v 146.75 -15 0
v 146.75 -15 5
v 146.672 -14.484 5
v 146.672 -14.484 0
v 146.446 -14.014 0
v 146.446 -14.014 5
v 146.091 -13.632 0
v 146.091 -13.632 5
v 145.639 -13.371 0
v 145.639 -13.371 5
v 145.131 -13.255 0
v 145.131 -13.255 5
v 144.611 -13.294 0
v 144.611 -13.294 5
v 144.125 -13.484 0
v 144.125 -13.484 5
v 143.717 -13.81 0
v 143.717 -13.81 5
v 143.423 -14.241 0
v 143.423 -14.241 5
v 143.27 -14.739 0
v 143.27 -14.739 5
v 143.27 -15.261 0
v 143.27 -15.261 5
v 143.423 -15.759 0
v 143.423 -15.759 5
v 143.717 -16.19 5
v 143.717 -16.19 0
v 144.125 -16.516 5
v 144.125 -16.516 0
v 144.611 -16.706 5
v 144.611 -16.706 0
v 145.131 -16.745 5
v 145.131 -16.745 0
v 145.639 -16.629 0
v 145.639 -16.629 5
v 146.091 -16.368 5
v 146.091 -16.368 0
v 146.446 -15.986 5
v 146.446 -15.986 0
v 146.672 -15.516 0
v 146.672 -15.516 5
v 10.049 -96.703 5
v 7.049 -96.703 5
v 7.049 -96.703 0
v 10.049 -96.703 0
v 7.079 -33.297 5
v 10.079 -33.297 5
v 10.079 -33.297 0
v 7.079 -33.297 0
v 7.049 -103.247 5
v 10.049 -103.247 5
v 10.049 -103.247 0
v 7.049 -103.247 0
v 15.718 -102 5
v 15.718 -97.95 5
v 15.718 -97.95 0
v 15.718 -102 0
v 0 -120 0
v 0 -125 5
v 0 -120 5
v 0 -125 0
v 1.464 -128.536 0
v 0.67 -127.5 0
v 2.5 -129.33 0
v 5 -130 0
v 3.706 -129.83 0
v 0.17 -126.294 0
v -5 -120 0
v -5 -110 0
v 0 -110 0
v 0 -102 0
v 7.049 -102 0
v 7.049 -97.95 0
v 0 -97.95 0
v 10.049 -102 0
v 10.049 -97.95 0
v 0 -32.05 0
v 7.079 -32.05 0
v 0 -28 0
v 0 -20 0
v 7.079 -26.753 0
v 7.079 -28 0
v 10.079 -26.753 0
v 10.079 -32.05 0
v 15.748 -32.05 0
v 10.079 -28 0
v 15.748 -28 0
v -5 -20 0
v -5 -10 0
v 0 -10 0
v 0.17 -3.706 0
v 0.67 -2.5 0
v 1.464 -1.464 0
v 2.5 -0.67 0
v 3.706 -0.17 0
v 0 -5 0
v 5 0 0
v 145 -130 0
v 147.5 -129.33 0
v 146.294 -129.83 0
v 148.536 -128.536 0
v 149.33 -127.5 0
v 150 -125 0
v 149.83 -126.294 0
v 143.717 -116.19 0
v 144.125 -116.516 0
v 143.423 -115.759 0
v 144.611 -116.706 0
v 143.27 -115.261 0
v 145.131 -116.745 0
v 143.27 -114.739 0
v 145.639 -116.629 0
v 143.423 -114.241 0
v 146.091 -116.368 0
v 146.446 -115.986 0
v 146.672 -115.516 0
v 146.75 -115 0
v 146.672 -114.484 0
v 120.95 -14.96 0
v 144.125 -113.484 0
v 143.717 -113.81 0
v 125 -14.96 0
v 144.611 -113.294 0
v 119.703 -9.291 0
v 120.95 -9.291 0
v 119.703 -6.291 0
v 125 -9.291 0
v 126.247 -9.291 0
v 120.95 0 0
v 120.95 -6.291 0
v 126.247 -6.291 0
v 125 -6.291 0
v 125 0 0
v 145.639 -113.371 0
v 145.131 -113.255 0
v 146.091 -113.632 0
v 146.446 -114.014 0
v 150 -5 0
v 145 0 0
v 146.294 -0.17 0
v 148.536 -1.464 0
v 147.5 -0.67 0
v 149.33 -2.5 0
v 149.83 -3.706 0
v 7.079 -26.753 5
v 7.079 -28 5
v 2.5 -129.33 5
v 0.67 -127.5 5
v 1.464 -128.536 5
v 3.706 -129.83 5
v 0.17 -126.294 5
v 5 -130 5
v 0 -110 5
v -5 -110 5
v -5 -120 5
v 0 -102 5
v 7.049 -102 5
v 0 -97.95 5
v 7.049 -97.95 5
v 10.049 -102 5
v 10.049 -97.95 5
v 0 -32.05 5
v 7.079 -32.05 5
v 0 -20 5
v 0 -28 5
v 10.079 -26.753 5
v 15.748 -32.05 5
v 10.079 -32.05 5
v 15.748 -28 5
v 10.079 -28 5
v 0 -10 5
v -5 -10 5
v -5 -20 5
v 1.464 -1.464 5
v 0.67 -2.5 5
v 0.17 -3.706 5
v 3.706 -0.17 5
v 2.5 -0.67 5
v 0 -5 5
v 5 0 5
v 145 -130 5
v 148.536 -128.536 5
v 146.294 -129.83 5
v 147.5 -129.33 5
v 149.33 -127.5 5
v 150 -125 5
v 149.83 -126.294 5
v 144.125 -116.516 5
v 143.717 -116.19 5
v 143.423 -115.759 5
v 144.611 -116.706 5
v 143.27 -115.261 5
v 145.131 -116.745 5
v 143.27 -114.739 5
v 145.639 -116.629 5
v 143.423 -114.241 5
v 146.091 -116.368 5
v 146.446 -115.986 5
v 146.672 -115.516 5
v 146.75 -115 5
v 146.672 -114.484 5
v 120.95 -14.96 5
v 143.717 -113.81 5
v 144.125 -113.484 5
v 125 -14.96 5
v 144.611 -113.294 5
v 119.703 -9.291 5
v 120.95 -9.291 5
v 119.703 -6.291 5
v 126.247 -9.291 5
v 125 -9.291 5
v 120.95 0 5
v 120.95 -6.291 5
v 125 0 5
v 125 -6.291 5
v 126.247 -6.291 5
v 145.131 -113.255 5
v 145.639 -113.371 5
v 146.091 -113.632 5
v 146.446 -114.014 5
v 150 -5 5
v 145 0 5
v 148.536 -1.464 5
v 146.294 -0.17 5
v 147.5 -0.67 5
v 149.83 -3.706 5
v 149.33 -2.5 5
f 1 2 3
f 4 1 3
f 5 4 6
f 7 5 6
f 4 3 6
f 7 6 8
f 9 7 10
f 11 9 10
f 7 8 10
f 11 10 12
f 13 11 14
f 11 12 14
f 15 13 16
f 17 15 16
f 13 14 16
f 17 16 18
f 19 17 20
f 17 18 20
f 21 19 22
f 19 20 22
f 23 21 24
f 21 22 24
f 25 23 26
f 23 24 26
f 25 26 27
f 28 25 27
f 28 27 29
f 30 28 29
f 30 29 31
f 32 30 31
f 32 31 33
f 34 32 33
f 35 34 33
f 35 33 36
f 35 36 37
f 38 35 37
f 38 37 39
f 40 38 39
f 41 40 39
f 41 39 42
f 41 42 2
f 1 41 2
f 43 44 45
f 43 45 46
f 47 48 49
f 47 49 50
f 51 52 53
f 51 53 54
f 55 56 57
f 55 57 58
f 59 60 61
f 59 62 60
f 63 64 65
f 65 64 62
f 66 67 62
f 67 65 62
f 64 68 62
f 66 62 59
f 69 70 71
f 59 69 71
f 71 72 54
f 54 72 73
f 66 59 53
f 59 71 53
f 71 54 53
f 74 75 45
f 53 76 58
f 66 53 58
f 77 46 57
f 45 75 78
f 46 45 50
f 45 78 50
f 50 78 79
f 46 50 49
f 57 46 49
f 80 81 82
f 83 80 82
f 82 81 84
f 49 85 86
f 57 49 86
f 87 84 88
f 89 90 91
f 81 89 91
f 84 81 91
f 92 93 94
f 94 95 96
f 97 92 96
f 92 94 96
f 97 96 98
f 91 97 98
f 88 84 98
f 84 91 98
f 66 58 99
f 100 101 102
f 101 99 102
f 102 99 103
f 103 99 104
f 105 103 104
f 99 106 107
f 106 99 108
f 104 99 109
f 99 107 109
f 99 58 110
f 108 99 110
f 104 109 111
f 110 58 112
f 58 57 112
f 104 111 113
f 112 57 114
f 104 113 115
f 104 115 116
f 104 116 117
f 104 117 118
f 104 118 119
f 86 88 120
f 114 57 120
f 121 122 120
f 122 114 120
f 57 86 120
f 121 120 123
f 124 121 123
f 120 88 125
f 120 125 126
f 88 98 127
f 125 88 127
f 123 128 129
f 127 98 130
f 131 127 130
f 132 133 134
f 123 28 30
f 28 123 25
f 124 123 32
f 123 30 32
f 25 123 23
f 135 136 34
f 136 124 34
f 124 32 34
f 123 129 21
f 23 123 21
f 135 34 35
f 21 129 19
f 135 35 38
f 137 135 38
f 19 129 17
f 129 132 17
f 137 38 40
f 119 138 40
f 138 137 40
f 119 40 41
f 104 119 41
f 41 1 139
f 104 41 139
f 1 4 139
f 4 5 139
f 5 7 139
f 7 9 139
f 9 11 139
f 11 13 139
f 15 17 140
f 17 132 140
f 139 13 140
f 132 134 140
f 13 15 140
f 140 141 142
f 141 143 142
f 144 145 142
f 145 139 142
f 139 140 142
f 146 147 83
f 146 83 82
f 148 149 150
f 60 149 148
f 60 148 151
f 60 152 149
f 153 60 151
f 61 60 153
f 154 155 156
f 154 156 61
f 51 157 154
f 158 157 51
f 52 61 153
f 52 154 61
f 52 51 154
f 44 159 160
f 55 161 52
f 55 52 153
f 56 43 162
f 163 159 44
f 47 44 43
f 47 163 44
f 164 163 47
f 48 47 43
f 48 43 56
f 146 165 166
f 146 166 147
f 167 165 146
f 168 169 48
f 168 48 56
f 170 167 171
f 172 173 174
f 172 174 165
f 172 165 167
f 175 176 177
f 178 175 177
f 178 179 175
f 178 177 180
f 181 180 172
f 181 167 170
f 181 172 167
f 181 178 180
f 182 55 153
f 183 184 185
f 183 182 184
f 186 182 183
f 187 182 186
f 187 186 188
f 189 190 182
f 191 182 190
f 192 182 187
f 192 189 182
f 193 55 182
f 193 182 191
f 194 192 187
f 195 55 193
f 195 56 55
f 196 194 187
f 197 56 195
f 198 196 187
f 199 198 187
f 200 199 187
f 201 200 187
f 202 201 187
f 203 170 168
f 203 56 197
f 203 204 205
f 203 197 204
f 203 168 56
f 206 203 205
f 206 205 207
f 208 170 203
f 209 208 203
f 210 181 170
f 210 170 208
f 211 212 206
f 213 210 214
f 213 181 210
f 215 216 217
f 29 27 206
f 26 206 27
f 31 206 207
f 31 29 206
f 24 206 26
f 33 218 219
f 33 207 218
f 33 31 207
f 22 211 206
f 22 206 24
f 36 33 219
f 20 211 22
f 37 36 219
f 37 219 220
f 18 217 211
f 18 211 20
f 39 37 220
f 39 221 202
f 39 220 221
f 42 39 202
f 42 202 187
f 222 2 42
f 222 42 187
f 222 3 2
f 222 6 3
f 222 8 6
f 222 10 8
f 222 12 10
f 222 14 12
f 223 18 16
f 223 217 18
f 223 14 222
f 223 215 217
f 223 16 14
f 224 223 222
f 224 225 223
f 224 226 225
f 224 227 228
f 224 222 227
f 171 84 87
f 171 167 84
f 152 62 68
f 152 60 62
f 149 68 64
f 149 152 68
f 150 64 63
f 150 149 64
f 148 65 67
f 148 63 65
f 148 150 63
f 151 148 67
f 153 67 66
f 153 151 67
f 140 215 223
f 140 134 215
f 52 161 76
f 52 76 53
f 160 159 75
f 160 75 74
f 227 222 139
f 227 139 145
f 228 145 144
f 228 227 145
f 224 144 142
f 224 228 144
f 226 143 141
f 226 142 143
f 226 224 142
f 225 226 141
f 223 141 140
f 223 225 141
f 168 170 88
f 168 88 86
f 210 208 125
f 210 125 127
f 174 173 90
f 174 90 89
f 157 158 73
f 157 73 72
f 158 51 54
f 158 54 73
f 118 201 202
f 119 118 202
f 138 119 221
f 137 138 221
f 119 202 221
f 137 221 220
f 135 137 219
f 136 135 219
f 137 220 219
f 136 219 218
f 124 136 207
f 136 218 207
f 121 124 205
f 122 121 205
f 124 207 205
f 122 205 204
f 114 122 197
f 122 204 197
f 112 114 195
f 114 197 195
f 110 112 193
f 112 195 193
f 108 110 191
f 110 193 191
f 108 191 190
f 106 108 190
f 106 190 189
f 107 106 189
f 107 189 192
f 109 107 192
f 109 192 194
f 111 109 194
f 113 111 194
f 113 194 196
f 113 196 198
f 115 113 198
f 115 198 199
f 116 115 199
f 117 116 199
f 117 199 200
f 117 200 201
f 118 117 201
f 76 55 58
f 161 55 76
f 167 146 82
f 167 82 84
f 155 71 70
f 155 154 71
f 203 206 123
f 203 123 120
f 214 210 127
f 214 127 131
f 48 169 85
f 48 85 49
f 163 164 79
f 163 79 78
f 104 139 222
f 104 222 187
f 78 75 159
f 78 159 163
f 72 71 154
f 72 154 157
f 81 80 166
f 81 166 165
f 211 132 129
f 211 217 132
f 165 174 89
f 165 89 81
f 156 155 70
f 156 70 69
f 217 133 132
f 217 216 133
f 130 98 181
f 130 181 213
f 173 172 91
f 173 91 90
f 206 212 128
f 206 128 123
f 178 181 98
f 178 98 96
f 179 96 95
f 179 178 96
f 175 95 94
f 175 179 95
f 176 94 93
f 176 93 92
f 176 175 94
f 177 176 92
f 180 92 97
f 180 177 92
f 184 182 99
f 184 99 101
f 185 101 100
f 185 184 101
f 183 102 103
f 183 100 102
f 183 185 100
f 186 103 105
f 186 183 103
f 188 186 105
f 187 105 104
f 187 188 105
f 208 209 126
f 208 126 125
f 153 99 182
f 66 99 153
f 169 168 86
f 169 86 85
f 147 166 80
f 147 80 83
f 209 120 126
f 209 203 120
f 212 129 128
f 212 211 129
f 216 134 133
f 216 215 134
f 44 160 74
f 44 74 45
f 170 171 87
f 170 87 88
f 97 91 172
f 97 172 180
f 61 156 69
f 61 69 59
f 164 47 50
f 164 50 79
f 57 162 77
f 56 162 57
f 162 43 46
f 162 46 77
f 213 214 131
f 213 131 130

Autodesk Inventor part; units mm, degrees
ref_plane "YZ Plane" through (0, 0, 0) normal (1, 0, 0) x (0, 1, 0)
ref_plane "XZ Plane" through (0, 0, 0) normal (0, 1, 0) x (-1, 0, 0)
ref_plane "XY Plane" through (0, 0, 0) normal (0, 0, 1) x (1, 0, 0)
sketch "Boceto1" plane through (0, 0, 0) normal (0, 0, 1) x (1, 0, 0)
  line L0 (0, 0) -> (150, 0)
  line L1 (150, 0) -> (150, -130)
  line L2 (150, -130) -> (0, -130)
  line L3 (0, -130) -> (0, 0)
  dimension "d2" = 130
  dimension "d3" = 150
extrude "Extrusión1" add sketch "Boceto1" along normal blind 5
fillet "Empalme1" radius 5 4 edges at (150, -130, 2.5) (150, 0, 2.5) (0, 0, 2.5) (0, -130, 2.5)
sketch "Boceto2" plane through (0, 0, 5) normal (0, 0, 1) x (1, 0, 0)
  line L0 (0, -125) -> (0, -5) projected
  line L1 (0, -10) -> (-5, -10)
  line L2 (-5, -10) -> (-5, -20)
  line L3 (-5, -20) -> (0, -20)
  line L4 (0, -20) -> (0, -10)
  line L5 (0, -110) -> (-5, -110)
  line L6 (-5, -110) -> (-5, -120)
  line L7 (-5, -120) -> (0, -120)
  line L8 (0, -120) -> (0, -110)
  line L9 (5, 0) -> (145, 0) projected
  point P0 (0, 0)
  dimension "d5" = 10
  dimension "d6" = 10
  dimension "d7" = 5
  dimension "d8" = 5
  dimension "d11" = 10
  dimension "d12" = 110
extrude "Extrusión2" add sketch "Boceto2" against normal blind 5
sketch "Boceto3" plane through (0, 0, 5) normal (0, 0, 1) x (1, 0, 0)
  line L0 (-5, -20) -> (0, -20) projected
  line L1 (0, -110) -> (0, -20) projected
  line L2 (-0.1512, -97.9504) -> (7.0488, -97.9504)
  line L3 (7.0488, -97.9504) -> (7.0488, -96.7034)
  line L4 (7.0488, -96.7034) -> (10.0488, -96.7034)
  line L5 (10.0488, -96.7034) -> (10.0488, -97.9504)
  line L6 (10.0488, -97.9504) -> (15.7176, -97.9504)
  line L7 (15.7176, -97.9504) -> (15.7176, -102)
  line L8 (15.7176, -102) -> (10.0488, -102)
  line L9 (10.0488, -102) -> (10.0488, -103.247)
  line L10 (10.0488, -103.247) -> (7.0488, -103.247)
  line L11 (7.0488, -103.247) -> (7.0488, -102)
  line L12 (7.0488, -102) -> (-0.1512, -102)
  line L13 (10.0793, -33.2966) -> (7.0793, -33.2966)
  line L14 (7.0793, -33.2966) -> (7.0793, -32.0496)
  line L15 (10.0793, -32.0496) -> (10.0793, -33.2966)
  line L16 (7.0793, -32.0496) -> (-0.1207, -32.0496)
  line L17 (15.7481, -32.0496) -> (10.0793, -32.0496)
  line L18 (-0.1207, -28) -> (7.0793, -28)
  line L19 (15.7481, -28) -> (15.7481, -32.0496)
  line L20 (7.0793, -28) -> (7.0793, -26.753)
  line L21 (7.0793, -26.753) -> (10.0793, -26.753)
  line L22 (10.0793, -26.753) -> (10.0793, -28)
  line L23 (10.0793, -28) -> (15.7481, -28)
  line L24 (-0.1207, -28) -> (-0.1207, -32.0496)
  line L25 (-0.1512, -97.9504) -> (-0.1512, -102)
  point P0 (0, 0)
  dimension "d15" = 8
  dimension "d16" = 8
extrude "Extrusión3" cut sketch "Boceto3" against normal blind 10
sketch "Boceto4" plane through (0, 0, 5) normal (0, 0, 1) x (1, 0, 0)
  line L0 (125, 0.788) -> (125, -6.2913)
  line L1 (125, -6.2913) -> (126.247, -6.2913)
  line L2 (126.247, -6.2913) -> (126.247, -9.2913)
  line L3 (126.247, -9.2913) -> (125, -9.2913)
  line L4 (125, -9.2913) -> (125, -14.9601)
  line L5 (125, -14.9601) -> (120.9504, -14.9601)
  line L6 (120.9504, -14.9601) -> (120.9504, -9.2913)
  line L7 (120.9504, -9.2913) -> (119.7034, -9.2913)
  line L8 (119.7034, -9.2913) -> (119.7034, -6.2913)
  line L9 (119.7034, -6.2913) -> (120.9504, -6.2913)
  line L10 (120.9504, -6.2913) -> (120.9504, 0.788)
  line L11 (120.9504, 0.788) -> (125, 0.788)
  point P0 (0, 0)
  point P1 (150, -5)
  dimension "d22" = 25
extrude "Extrusión4" cut sketch "Boceto4" against normal blind 10
sketch "Boceto5" plane through (0, 0, 5) normal (0, 0, 1) x (1, 0, 0)
  circle A0 centre (145, -115) radius 1.75
  circle A1 centre (145, -15) radius 1.75
  point P0 (0, 0)
  dimension "d24" = 3.5
  dimension "d25" = 3.5
extrude "Extrusión5" cut sketch "Boceto5" against normal blind 10
properties part number "pieza protectora ramps"
